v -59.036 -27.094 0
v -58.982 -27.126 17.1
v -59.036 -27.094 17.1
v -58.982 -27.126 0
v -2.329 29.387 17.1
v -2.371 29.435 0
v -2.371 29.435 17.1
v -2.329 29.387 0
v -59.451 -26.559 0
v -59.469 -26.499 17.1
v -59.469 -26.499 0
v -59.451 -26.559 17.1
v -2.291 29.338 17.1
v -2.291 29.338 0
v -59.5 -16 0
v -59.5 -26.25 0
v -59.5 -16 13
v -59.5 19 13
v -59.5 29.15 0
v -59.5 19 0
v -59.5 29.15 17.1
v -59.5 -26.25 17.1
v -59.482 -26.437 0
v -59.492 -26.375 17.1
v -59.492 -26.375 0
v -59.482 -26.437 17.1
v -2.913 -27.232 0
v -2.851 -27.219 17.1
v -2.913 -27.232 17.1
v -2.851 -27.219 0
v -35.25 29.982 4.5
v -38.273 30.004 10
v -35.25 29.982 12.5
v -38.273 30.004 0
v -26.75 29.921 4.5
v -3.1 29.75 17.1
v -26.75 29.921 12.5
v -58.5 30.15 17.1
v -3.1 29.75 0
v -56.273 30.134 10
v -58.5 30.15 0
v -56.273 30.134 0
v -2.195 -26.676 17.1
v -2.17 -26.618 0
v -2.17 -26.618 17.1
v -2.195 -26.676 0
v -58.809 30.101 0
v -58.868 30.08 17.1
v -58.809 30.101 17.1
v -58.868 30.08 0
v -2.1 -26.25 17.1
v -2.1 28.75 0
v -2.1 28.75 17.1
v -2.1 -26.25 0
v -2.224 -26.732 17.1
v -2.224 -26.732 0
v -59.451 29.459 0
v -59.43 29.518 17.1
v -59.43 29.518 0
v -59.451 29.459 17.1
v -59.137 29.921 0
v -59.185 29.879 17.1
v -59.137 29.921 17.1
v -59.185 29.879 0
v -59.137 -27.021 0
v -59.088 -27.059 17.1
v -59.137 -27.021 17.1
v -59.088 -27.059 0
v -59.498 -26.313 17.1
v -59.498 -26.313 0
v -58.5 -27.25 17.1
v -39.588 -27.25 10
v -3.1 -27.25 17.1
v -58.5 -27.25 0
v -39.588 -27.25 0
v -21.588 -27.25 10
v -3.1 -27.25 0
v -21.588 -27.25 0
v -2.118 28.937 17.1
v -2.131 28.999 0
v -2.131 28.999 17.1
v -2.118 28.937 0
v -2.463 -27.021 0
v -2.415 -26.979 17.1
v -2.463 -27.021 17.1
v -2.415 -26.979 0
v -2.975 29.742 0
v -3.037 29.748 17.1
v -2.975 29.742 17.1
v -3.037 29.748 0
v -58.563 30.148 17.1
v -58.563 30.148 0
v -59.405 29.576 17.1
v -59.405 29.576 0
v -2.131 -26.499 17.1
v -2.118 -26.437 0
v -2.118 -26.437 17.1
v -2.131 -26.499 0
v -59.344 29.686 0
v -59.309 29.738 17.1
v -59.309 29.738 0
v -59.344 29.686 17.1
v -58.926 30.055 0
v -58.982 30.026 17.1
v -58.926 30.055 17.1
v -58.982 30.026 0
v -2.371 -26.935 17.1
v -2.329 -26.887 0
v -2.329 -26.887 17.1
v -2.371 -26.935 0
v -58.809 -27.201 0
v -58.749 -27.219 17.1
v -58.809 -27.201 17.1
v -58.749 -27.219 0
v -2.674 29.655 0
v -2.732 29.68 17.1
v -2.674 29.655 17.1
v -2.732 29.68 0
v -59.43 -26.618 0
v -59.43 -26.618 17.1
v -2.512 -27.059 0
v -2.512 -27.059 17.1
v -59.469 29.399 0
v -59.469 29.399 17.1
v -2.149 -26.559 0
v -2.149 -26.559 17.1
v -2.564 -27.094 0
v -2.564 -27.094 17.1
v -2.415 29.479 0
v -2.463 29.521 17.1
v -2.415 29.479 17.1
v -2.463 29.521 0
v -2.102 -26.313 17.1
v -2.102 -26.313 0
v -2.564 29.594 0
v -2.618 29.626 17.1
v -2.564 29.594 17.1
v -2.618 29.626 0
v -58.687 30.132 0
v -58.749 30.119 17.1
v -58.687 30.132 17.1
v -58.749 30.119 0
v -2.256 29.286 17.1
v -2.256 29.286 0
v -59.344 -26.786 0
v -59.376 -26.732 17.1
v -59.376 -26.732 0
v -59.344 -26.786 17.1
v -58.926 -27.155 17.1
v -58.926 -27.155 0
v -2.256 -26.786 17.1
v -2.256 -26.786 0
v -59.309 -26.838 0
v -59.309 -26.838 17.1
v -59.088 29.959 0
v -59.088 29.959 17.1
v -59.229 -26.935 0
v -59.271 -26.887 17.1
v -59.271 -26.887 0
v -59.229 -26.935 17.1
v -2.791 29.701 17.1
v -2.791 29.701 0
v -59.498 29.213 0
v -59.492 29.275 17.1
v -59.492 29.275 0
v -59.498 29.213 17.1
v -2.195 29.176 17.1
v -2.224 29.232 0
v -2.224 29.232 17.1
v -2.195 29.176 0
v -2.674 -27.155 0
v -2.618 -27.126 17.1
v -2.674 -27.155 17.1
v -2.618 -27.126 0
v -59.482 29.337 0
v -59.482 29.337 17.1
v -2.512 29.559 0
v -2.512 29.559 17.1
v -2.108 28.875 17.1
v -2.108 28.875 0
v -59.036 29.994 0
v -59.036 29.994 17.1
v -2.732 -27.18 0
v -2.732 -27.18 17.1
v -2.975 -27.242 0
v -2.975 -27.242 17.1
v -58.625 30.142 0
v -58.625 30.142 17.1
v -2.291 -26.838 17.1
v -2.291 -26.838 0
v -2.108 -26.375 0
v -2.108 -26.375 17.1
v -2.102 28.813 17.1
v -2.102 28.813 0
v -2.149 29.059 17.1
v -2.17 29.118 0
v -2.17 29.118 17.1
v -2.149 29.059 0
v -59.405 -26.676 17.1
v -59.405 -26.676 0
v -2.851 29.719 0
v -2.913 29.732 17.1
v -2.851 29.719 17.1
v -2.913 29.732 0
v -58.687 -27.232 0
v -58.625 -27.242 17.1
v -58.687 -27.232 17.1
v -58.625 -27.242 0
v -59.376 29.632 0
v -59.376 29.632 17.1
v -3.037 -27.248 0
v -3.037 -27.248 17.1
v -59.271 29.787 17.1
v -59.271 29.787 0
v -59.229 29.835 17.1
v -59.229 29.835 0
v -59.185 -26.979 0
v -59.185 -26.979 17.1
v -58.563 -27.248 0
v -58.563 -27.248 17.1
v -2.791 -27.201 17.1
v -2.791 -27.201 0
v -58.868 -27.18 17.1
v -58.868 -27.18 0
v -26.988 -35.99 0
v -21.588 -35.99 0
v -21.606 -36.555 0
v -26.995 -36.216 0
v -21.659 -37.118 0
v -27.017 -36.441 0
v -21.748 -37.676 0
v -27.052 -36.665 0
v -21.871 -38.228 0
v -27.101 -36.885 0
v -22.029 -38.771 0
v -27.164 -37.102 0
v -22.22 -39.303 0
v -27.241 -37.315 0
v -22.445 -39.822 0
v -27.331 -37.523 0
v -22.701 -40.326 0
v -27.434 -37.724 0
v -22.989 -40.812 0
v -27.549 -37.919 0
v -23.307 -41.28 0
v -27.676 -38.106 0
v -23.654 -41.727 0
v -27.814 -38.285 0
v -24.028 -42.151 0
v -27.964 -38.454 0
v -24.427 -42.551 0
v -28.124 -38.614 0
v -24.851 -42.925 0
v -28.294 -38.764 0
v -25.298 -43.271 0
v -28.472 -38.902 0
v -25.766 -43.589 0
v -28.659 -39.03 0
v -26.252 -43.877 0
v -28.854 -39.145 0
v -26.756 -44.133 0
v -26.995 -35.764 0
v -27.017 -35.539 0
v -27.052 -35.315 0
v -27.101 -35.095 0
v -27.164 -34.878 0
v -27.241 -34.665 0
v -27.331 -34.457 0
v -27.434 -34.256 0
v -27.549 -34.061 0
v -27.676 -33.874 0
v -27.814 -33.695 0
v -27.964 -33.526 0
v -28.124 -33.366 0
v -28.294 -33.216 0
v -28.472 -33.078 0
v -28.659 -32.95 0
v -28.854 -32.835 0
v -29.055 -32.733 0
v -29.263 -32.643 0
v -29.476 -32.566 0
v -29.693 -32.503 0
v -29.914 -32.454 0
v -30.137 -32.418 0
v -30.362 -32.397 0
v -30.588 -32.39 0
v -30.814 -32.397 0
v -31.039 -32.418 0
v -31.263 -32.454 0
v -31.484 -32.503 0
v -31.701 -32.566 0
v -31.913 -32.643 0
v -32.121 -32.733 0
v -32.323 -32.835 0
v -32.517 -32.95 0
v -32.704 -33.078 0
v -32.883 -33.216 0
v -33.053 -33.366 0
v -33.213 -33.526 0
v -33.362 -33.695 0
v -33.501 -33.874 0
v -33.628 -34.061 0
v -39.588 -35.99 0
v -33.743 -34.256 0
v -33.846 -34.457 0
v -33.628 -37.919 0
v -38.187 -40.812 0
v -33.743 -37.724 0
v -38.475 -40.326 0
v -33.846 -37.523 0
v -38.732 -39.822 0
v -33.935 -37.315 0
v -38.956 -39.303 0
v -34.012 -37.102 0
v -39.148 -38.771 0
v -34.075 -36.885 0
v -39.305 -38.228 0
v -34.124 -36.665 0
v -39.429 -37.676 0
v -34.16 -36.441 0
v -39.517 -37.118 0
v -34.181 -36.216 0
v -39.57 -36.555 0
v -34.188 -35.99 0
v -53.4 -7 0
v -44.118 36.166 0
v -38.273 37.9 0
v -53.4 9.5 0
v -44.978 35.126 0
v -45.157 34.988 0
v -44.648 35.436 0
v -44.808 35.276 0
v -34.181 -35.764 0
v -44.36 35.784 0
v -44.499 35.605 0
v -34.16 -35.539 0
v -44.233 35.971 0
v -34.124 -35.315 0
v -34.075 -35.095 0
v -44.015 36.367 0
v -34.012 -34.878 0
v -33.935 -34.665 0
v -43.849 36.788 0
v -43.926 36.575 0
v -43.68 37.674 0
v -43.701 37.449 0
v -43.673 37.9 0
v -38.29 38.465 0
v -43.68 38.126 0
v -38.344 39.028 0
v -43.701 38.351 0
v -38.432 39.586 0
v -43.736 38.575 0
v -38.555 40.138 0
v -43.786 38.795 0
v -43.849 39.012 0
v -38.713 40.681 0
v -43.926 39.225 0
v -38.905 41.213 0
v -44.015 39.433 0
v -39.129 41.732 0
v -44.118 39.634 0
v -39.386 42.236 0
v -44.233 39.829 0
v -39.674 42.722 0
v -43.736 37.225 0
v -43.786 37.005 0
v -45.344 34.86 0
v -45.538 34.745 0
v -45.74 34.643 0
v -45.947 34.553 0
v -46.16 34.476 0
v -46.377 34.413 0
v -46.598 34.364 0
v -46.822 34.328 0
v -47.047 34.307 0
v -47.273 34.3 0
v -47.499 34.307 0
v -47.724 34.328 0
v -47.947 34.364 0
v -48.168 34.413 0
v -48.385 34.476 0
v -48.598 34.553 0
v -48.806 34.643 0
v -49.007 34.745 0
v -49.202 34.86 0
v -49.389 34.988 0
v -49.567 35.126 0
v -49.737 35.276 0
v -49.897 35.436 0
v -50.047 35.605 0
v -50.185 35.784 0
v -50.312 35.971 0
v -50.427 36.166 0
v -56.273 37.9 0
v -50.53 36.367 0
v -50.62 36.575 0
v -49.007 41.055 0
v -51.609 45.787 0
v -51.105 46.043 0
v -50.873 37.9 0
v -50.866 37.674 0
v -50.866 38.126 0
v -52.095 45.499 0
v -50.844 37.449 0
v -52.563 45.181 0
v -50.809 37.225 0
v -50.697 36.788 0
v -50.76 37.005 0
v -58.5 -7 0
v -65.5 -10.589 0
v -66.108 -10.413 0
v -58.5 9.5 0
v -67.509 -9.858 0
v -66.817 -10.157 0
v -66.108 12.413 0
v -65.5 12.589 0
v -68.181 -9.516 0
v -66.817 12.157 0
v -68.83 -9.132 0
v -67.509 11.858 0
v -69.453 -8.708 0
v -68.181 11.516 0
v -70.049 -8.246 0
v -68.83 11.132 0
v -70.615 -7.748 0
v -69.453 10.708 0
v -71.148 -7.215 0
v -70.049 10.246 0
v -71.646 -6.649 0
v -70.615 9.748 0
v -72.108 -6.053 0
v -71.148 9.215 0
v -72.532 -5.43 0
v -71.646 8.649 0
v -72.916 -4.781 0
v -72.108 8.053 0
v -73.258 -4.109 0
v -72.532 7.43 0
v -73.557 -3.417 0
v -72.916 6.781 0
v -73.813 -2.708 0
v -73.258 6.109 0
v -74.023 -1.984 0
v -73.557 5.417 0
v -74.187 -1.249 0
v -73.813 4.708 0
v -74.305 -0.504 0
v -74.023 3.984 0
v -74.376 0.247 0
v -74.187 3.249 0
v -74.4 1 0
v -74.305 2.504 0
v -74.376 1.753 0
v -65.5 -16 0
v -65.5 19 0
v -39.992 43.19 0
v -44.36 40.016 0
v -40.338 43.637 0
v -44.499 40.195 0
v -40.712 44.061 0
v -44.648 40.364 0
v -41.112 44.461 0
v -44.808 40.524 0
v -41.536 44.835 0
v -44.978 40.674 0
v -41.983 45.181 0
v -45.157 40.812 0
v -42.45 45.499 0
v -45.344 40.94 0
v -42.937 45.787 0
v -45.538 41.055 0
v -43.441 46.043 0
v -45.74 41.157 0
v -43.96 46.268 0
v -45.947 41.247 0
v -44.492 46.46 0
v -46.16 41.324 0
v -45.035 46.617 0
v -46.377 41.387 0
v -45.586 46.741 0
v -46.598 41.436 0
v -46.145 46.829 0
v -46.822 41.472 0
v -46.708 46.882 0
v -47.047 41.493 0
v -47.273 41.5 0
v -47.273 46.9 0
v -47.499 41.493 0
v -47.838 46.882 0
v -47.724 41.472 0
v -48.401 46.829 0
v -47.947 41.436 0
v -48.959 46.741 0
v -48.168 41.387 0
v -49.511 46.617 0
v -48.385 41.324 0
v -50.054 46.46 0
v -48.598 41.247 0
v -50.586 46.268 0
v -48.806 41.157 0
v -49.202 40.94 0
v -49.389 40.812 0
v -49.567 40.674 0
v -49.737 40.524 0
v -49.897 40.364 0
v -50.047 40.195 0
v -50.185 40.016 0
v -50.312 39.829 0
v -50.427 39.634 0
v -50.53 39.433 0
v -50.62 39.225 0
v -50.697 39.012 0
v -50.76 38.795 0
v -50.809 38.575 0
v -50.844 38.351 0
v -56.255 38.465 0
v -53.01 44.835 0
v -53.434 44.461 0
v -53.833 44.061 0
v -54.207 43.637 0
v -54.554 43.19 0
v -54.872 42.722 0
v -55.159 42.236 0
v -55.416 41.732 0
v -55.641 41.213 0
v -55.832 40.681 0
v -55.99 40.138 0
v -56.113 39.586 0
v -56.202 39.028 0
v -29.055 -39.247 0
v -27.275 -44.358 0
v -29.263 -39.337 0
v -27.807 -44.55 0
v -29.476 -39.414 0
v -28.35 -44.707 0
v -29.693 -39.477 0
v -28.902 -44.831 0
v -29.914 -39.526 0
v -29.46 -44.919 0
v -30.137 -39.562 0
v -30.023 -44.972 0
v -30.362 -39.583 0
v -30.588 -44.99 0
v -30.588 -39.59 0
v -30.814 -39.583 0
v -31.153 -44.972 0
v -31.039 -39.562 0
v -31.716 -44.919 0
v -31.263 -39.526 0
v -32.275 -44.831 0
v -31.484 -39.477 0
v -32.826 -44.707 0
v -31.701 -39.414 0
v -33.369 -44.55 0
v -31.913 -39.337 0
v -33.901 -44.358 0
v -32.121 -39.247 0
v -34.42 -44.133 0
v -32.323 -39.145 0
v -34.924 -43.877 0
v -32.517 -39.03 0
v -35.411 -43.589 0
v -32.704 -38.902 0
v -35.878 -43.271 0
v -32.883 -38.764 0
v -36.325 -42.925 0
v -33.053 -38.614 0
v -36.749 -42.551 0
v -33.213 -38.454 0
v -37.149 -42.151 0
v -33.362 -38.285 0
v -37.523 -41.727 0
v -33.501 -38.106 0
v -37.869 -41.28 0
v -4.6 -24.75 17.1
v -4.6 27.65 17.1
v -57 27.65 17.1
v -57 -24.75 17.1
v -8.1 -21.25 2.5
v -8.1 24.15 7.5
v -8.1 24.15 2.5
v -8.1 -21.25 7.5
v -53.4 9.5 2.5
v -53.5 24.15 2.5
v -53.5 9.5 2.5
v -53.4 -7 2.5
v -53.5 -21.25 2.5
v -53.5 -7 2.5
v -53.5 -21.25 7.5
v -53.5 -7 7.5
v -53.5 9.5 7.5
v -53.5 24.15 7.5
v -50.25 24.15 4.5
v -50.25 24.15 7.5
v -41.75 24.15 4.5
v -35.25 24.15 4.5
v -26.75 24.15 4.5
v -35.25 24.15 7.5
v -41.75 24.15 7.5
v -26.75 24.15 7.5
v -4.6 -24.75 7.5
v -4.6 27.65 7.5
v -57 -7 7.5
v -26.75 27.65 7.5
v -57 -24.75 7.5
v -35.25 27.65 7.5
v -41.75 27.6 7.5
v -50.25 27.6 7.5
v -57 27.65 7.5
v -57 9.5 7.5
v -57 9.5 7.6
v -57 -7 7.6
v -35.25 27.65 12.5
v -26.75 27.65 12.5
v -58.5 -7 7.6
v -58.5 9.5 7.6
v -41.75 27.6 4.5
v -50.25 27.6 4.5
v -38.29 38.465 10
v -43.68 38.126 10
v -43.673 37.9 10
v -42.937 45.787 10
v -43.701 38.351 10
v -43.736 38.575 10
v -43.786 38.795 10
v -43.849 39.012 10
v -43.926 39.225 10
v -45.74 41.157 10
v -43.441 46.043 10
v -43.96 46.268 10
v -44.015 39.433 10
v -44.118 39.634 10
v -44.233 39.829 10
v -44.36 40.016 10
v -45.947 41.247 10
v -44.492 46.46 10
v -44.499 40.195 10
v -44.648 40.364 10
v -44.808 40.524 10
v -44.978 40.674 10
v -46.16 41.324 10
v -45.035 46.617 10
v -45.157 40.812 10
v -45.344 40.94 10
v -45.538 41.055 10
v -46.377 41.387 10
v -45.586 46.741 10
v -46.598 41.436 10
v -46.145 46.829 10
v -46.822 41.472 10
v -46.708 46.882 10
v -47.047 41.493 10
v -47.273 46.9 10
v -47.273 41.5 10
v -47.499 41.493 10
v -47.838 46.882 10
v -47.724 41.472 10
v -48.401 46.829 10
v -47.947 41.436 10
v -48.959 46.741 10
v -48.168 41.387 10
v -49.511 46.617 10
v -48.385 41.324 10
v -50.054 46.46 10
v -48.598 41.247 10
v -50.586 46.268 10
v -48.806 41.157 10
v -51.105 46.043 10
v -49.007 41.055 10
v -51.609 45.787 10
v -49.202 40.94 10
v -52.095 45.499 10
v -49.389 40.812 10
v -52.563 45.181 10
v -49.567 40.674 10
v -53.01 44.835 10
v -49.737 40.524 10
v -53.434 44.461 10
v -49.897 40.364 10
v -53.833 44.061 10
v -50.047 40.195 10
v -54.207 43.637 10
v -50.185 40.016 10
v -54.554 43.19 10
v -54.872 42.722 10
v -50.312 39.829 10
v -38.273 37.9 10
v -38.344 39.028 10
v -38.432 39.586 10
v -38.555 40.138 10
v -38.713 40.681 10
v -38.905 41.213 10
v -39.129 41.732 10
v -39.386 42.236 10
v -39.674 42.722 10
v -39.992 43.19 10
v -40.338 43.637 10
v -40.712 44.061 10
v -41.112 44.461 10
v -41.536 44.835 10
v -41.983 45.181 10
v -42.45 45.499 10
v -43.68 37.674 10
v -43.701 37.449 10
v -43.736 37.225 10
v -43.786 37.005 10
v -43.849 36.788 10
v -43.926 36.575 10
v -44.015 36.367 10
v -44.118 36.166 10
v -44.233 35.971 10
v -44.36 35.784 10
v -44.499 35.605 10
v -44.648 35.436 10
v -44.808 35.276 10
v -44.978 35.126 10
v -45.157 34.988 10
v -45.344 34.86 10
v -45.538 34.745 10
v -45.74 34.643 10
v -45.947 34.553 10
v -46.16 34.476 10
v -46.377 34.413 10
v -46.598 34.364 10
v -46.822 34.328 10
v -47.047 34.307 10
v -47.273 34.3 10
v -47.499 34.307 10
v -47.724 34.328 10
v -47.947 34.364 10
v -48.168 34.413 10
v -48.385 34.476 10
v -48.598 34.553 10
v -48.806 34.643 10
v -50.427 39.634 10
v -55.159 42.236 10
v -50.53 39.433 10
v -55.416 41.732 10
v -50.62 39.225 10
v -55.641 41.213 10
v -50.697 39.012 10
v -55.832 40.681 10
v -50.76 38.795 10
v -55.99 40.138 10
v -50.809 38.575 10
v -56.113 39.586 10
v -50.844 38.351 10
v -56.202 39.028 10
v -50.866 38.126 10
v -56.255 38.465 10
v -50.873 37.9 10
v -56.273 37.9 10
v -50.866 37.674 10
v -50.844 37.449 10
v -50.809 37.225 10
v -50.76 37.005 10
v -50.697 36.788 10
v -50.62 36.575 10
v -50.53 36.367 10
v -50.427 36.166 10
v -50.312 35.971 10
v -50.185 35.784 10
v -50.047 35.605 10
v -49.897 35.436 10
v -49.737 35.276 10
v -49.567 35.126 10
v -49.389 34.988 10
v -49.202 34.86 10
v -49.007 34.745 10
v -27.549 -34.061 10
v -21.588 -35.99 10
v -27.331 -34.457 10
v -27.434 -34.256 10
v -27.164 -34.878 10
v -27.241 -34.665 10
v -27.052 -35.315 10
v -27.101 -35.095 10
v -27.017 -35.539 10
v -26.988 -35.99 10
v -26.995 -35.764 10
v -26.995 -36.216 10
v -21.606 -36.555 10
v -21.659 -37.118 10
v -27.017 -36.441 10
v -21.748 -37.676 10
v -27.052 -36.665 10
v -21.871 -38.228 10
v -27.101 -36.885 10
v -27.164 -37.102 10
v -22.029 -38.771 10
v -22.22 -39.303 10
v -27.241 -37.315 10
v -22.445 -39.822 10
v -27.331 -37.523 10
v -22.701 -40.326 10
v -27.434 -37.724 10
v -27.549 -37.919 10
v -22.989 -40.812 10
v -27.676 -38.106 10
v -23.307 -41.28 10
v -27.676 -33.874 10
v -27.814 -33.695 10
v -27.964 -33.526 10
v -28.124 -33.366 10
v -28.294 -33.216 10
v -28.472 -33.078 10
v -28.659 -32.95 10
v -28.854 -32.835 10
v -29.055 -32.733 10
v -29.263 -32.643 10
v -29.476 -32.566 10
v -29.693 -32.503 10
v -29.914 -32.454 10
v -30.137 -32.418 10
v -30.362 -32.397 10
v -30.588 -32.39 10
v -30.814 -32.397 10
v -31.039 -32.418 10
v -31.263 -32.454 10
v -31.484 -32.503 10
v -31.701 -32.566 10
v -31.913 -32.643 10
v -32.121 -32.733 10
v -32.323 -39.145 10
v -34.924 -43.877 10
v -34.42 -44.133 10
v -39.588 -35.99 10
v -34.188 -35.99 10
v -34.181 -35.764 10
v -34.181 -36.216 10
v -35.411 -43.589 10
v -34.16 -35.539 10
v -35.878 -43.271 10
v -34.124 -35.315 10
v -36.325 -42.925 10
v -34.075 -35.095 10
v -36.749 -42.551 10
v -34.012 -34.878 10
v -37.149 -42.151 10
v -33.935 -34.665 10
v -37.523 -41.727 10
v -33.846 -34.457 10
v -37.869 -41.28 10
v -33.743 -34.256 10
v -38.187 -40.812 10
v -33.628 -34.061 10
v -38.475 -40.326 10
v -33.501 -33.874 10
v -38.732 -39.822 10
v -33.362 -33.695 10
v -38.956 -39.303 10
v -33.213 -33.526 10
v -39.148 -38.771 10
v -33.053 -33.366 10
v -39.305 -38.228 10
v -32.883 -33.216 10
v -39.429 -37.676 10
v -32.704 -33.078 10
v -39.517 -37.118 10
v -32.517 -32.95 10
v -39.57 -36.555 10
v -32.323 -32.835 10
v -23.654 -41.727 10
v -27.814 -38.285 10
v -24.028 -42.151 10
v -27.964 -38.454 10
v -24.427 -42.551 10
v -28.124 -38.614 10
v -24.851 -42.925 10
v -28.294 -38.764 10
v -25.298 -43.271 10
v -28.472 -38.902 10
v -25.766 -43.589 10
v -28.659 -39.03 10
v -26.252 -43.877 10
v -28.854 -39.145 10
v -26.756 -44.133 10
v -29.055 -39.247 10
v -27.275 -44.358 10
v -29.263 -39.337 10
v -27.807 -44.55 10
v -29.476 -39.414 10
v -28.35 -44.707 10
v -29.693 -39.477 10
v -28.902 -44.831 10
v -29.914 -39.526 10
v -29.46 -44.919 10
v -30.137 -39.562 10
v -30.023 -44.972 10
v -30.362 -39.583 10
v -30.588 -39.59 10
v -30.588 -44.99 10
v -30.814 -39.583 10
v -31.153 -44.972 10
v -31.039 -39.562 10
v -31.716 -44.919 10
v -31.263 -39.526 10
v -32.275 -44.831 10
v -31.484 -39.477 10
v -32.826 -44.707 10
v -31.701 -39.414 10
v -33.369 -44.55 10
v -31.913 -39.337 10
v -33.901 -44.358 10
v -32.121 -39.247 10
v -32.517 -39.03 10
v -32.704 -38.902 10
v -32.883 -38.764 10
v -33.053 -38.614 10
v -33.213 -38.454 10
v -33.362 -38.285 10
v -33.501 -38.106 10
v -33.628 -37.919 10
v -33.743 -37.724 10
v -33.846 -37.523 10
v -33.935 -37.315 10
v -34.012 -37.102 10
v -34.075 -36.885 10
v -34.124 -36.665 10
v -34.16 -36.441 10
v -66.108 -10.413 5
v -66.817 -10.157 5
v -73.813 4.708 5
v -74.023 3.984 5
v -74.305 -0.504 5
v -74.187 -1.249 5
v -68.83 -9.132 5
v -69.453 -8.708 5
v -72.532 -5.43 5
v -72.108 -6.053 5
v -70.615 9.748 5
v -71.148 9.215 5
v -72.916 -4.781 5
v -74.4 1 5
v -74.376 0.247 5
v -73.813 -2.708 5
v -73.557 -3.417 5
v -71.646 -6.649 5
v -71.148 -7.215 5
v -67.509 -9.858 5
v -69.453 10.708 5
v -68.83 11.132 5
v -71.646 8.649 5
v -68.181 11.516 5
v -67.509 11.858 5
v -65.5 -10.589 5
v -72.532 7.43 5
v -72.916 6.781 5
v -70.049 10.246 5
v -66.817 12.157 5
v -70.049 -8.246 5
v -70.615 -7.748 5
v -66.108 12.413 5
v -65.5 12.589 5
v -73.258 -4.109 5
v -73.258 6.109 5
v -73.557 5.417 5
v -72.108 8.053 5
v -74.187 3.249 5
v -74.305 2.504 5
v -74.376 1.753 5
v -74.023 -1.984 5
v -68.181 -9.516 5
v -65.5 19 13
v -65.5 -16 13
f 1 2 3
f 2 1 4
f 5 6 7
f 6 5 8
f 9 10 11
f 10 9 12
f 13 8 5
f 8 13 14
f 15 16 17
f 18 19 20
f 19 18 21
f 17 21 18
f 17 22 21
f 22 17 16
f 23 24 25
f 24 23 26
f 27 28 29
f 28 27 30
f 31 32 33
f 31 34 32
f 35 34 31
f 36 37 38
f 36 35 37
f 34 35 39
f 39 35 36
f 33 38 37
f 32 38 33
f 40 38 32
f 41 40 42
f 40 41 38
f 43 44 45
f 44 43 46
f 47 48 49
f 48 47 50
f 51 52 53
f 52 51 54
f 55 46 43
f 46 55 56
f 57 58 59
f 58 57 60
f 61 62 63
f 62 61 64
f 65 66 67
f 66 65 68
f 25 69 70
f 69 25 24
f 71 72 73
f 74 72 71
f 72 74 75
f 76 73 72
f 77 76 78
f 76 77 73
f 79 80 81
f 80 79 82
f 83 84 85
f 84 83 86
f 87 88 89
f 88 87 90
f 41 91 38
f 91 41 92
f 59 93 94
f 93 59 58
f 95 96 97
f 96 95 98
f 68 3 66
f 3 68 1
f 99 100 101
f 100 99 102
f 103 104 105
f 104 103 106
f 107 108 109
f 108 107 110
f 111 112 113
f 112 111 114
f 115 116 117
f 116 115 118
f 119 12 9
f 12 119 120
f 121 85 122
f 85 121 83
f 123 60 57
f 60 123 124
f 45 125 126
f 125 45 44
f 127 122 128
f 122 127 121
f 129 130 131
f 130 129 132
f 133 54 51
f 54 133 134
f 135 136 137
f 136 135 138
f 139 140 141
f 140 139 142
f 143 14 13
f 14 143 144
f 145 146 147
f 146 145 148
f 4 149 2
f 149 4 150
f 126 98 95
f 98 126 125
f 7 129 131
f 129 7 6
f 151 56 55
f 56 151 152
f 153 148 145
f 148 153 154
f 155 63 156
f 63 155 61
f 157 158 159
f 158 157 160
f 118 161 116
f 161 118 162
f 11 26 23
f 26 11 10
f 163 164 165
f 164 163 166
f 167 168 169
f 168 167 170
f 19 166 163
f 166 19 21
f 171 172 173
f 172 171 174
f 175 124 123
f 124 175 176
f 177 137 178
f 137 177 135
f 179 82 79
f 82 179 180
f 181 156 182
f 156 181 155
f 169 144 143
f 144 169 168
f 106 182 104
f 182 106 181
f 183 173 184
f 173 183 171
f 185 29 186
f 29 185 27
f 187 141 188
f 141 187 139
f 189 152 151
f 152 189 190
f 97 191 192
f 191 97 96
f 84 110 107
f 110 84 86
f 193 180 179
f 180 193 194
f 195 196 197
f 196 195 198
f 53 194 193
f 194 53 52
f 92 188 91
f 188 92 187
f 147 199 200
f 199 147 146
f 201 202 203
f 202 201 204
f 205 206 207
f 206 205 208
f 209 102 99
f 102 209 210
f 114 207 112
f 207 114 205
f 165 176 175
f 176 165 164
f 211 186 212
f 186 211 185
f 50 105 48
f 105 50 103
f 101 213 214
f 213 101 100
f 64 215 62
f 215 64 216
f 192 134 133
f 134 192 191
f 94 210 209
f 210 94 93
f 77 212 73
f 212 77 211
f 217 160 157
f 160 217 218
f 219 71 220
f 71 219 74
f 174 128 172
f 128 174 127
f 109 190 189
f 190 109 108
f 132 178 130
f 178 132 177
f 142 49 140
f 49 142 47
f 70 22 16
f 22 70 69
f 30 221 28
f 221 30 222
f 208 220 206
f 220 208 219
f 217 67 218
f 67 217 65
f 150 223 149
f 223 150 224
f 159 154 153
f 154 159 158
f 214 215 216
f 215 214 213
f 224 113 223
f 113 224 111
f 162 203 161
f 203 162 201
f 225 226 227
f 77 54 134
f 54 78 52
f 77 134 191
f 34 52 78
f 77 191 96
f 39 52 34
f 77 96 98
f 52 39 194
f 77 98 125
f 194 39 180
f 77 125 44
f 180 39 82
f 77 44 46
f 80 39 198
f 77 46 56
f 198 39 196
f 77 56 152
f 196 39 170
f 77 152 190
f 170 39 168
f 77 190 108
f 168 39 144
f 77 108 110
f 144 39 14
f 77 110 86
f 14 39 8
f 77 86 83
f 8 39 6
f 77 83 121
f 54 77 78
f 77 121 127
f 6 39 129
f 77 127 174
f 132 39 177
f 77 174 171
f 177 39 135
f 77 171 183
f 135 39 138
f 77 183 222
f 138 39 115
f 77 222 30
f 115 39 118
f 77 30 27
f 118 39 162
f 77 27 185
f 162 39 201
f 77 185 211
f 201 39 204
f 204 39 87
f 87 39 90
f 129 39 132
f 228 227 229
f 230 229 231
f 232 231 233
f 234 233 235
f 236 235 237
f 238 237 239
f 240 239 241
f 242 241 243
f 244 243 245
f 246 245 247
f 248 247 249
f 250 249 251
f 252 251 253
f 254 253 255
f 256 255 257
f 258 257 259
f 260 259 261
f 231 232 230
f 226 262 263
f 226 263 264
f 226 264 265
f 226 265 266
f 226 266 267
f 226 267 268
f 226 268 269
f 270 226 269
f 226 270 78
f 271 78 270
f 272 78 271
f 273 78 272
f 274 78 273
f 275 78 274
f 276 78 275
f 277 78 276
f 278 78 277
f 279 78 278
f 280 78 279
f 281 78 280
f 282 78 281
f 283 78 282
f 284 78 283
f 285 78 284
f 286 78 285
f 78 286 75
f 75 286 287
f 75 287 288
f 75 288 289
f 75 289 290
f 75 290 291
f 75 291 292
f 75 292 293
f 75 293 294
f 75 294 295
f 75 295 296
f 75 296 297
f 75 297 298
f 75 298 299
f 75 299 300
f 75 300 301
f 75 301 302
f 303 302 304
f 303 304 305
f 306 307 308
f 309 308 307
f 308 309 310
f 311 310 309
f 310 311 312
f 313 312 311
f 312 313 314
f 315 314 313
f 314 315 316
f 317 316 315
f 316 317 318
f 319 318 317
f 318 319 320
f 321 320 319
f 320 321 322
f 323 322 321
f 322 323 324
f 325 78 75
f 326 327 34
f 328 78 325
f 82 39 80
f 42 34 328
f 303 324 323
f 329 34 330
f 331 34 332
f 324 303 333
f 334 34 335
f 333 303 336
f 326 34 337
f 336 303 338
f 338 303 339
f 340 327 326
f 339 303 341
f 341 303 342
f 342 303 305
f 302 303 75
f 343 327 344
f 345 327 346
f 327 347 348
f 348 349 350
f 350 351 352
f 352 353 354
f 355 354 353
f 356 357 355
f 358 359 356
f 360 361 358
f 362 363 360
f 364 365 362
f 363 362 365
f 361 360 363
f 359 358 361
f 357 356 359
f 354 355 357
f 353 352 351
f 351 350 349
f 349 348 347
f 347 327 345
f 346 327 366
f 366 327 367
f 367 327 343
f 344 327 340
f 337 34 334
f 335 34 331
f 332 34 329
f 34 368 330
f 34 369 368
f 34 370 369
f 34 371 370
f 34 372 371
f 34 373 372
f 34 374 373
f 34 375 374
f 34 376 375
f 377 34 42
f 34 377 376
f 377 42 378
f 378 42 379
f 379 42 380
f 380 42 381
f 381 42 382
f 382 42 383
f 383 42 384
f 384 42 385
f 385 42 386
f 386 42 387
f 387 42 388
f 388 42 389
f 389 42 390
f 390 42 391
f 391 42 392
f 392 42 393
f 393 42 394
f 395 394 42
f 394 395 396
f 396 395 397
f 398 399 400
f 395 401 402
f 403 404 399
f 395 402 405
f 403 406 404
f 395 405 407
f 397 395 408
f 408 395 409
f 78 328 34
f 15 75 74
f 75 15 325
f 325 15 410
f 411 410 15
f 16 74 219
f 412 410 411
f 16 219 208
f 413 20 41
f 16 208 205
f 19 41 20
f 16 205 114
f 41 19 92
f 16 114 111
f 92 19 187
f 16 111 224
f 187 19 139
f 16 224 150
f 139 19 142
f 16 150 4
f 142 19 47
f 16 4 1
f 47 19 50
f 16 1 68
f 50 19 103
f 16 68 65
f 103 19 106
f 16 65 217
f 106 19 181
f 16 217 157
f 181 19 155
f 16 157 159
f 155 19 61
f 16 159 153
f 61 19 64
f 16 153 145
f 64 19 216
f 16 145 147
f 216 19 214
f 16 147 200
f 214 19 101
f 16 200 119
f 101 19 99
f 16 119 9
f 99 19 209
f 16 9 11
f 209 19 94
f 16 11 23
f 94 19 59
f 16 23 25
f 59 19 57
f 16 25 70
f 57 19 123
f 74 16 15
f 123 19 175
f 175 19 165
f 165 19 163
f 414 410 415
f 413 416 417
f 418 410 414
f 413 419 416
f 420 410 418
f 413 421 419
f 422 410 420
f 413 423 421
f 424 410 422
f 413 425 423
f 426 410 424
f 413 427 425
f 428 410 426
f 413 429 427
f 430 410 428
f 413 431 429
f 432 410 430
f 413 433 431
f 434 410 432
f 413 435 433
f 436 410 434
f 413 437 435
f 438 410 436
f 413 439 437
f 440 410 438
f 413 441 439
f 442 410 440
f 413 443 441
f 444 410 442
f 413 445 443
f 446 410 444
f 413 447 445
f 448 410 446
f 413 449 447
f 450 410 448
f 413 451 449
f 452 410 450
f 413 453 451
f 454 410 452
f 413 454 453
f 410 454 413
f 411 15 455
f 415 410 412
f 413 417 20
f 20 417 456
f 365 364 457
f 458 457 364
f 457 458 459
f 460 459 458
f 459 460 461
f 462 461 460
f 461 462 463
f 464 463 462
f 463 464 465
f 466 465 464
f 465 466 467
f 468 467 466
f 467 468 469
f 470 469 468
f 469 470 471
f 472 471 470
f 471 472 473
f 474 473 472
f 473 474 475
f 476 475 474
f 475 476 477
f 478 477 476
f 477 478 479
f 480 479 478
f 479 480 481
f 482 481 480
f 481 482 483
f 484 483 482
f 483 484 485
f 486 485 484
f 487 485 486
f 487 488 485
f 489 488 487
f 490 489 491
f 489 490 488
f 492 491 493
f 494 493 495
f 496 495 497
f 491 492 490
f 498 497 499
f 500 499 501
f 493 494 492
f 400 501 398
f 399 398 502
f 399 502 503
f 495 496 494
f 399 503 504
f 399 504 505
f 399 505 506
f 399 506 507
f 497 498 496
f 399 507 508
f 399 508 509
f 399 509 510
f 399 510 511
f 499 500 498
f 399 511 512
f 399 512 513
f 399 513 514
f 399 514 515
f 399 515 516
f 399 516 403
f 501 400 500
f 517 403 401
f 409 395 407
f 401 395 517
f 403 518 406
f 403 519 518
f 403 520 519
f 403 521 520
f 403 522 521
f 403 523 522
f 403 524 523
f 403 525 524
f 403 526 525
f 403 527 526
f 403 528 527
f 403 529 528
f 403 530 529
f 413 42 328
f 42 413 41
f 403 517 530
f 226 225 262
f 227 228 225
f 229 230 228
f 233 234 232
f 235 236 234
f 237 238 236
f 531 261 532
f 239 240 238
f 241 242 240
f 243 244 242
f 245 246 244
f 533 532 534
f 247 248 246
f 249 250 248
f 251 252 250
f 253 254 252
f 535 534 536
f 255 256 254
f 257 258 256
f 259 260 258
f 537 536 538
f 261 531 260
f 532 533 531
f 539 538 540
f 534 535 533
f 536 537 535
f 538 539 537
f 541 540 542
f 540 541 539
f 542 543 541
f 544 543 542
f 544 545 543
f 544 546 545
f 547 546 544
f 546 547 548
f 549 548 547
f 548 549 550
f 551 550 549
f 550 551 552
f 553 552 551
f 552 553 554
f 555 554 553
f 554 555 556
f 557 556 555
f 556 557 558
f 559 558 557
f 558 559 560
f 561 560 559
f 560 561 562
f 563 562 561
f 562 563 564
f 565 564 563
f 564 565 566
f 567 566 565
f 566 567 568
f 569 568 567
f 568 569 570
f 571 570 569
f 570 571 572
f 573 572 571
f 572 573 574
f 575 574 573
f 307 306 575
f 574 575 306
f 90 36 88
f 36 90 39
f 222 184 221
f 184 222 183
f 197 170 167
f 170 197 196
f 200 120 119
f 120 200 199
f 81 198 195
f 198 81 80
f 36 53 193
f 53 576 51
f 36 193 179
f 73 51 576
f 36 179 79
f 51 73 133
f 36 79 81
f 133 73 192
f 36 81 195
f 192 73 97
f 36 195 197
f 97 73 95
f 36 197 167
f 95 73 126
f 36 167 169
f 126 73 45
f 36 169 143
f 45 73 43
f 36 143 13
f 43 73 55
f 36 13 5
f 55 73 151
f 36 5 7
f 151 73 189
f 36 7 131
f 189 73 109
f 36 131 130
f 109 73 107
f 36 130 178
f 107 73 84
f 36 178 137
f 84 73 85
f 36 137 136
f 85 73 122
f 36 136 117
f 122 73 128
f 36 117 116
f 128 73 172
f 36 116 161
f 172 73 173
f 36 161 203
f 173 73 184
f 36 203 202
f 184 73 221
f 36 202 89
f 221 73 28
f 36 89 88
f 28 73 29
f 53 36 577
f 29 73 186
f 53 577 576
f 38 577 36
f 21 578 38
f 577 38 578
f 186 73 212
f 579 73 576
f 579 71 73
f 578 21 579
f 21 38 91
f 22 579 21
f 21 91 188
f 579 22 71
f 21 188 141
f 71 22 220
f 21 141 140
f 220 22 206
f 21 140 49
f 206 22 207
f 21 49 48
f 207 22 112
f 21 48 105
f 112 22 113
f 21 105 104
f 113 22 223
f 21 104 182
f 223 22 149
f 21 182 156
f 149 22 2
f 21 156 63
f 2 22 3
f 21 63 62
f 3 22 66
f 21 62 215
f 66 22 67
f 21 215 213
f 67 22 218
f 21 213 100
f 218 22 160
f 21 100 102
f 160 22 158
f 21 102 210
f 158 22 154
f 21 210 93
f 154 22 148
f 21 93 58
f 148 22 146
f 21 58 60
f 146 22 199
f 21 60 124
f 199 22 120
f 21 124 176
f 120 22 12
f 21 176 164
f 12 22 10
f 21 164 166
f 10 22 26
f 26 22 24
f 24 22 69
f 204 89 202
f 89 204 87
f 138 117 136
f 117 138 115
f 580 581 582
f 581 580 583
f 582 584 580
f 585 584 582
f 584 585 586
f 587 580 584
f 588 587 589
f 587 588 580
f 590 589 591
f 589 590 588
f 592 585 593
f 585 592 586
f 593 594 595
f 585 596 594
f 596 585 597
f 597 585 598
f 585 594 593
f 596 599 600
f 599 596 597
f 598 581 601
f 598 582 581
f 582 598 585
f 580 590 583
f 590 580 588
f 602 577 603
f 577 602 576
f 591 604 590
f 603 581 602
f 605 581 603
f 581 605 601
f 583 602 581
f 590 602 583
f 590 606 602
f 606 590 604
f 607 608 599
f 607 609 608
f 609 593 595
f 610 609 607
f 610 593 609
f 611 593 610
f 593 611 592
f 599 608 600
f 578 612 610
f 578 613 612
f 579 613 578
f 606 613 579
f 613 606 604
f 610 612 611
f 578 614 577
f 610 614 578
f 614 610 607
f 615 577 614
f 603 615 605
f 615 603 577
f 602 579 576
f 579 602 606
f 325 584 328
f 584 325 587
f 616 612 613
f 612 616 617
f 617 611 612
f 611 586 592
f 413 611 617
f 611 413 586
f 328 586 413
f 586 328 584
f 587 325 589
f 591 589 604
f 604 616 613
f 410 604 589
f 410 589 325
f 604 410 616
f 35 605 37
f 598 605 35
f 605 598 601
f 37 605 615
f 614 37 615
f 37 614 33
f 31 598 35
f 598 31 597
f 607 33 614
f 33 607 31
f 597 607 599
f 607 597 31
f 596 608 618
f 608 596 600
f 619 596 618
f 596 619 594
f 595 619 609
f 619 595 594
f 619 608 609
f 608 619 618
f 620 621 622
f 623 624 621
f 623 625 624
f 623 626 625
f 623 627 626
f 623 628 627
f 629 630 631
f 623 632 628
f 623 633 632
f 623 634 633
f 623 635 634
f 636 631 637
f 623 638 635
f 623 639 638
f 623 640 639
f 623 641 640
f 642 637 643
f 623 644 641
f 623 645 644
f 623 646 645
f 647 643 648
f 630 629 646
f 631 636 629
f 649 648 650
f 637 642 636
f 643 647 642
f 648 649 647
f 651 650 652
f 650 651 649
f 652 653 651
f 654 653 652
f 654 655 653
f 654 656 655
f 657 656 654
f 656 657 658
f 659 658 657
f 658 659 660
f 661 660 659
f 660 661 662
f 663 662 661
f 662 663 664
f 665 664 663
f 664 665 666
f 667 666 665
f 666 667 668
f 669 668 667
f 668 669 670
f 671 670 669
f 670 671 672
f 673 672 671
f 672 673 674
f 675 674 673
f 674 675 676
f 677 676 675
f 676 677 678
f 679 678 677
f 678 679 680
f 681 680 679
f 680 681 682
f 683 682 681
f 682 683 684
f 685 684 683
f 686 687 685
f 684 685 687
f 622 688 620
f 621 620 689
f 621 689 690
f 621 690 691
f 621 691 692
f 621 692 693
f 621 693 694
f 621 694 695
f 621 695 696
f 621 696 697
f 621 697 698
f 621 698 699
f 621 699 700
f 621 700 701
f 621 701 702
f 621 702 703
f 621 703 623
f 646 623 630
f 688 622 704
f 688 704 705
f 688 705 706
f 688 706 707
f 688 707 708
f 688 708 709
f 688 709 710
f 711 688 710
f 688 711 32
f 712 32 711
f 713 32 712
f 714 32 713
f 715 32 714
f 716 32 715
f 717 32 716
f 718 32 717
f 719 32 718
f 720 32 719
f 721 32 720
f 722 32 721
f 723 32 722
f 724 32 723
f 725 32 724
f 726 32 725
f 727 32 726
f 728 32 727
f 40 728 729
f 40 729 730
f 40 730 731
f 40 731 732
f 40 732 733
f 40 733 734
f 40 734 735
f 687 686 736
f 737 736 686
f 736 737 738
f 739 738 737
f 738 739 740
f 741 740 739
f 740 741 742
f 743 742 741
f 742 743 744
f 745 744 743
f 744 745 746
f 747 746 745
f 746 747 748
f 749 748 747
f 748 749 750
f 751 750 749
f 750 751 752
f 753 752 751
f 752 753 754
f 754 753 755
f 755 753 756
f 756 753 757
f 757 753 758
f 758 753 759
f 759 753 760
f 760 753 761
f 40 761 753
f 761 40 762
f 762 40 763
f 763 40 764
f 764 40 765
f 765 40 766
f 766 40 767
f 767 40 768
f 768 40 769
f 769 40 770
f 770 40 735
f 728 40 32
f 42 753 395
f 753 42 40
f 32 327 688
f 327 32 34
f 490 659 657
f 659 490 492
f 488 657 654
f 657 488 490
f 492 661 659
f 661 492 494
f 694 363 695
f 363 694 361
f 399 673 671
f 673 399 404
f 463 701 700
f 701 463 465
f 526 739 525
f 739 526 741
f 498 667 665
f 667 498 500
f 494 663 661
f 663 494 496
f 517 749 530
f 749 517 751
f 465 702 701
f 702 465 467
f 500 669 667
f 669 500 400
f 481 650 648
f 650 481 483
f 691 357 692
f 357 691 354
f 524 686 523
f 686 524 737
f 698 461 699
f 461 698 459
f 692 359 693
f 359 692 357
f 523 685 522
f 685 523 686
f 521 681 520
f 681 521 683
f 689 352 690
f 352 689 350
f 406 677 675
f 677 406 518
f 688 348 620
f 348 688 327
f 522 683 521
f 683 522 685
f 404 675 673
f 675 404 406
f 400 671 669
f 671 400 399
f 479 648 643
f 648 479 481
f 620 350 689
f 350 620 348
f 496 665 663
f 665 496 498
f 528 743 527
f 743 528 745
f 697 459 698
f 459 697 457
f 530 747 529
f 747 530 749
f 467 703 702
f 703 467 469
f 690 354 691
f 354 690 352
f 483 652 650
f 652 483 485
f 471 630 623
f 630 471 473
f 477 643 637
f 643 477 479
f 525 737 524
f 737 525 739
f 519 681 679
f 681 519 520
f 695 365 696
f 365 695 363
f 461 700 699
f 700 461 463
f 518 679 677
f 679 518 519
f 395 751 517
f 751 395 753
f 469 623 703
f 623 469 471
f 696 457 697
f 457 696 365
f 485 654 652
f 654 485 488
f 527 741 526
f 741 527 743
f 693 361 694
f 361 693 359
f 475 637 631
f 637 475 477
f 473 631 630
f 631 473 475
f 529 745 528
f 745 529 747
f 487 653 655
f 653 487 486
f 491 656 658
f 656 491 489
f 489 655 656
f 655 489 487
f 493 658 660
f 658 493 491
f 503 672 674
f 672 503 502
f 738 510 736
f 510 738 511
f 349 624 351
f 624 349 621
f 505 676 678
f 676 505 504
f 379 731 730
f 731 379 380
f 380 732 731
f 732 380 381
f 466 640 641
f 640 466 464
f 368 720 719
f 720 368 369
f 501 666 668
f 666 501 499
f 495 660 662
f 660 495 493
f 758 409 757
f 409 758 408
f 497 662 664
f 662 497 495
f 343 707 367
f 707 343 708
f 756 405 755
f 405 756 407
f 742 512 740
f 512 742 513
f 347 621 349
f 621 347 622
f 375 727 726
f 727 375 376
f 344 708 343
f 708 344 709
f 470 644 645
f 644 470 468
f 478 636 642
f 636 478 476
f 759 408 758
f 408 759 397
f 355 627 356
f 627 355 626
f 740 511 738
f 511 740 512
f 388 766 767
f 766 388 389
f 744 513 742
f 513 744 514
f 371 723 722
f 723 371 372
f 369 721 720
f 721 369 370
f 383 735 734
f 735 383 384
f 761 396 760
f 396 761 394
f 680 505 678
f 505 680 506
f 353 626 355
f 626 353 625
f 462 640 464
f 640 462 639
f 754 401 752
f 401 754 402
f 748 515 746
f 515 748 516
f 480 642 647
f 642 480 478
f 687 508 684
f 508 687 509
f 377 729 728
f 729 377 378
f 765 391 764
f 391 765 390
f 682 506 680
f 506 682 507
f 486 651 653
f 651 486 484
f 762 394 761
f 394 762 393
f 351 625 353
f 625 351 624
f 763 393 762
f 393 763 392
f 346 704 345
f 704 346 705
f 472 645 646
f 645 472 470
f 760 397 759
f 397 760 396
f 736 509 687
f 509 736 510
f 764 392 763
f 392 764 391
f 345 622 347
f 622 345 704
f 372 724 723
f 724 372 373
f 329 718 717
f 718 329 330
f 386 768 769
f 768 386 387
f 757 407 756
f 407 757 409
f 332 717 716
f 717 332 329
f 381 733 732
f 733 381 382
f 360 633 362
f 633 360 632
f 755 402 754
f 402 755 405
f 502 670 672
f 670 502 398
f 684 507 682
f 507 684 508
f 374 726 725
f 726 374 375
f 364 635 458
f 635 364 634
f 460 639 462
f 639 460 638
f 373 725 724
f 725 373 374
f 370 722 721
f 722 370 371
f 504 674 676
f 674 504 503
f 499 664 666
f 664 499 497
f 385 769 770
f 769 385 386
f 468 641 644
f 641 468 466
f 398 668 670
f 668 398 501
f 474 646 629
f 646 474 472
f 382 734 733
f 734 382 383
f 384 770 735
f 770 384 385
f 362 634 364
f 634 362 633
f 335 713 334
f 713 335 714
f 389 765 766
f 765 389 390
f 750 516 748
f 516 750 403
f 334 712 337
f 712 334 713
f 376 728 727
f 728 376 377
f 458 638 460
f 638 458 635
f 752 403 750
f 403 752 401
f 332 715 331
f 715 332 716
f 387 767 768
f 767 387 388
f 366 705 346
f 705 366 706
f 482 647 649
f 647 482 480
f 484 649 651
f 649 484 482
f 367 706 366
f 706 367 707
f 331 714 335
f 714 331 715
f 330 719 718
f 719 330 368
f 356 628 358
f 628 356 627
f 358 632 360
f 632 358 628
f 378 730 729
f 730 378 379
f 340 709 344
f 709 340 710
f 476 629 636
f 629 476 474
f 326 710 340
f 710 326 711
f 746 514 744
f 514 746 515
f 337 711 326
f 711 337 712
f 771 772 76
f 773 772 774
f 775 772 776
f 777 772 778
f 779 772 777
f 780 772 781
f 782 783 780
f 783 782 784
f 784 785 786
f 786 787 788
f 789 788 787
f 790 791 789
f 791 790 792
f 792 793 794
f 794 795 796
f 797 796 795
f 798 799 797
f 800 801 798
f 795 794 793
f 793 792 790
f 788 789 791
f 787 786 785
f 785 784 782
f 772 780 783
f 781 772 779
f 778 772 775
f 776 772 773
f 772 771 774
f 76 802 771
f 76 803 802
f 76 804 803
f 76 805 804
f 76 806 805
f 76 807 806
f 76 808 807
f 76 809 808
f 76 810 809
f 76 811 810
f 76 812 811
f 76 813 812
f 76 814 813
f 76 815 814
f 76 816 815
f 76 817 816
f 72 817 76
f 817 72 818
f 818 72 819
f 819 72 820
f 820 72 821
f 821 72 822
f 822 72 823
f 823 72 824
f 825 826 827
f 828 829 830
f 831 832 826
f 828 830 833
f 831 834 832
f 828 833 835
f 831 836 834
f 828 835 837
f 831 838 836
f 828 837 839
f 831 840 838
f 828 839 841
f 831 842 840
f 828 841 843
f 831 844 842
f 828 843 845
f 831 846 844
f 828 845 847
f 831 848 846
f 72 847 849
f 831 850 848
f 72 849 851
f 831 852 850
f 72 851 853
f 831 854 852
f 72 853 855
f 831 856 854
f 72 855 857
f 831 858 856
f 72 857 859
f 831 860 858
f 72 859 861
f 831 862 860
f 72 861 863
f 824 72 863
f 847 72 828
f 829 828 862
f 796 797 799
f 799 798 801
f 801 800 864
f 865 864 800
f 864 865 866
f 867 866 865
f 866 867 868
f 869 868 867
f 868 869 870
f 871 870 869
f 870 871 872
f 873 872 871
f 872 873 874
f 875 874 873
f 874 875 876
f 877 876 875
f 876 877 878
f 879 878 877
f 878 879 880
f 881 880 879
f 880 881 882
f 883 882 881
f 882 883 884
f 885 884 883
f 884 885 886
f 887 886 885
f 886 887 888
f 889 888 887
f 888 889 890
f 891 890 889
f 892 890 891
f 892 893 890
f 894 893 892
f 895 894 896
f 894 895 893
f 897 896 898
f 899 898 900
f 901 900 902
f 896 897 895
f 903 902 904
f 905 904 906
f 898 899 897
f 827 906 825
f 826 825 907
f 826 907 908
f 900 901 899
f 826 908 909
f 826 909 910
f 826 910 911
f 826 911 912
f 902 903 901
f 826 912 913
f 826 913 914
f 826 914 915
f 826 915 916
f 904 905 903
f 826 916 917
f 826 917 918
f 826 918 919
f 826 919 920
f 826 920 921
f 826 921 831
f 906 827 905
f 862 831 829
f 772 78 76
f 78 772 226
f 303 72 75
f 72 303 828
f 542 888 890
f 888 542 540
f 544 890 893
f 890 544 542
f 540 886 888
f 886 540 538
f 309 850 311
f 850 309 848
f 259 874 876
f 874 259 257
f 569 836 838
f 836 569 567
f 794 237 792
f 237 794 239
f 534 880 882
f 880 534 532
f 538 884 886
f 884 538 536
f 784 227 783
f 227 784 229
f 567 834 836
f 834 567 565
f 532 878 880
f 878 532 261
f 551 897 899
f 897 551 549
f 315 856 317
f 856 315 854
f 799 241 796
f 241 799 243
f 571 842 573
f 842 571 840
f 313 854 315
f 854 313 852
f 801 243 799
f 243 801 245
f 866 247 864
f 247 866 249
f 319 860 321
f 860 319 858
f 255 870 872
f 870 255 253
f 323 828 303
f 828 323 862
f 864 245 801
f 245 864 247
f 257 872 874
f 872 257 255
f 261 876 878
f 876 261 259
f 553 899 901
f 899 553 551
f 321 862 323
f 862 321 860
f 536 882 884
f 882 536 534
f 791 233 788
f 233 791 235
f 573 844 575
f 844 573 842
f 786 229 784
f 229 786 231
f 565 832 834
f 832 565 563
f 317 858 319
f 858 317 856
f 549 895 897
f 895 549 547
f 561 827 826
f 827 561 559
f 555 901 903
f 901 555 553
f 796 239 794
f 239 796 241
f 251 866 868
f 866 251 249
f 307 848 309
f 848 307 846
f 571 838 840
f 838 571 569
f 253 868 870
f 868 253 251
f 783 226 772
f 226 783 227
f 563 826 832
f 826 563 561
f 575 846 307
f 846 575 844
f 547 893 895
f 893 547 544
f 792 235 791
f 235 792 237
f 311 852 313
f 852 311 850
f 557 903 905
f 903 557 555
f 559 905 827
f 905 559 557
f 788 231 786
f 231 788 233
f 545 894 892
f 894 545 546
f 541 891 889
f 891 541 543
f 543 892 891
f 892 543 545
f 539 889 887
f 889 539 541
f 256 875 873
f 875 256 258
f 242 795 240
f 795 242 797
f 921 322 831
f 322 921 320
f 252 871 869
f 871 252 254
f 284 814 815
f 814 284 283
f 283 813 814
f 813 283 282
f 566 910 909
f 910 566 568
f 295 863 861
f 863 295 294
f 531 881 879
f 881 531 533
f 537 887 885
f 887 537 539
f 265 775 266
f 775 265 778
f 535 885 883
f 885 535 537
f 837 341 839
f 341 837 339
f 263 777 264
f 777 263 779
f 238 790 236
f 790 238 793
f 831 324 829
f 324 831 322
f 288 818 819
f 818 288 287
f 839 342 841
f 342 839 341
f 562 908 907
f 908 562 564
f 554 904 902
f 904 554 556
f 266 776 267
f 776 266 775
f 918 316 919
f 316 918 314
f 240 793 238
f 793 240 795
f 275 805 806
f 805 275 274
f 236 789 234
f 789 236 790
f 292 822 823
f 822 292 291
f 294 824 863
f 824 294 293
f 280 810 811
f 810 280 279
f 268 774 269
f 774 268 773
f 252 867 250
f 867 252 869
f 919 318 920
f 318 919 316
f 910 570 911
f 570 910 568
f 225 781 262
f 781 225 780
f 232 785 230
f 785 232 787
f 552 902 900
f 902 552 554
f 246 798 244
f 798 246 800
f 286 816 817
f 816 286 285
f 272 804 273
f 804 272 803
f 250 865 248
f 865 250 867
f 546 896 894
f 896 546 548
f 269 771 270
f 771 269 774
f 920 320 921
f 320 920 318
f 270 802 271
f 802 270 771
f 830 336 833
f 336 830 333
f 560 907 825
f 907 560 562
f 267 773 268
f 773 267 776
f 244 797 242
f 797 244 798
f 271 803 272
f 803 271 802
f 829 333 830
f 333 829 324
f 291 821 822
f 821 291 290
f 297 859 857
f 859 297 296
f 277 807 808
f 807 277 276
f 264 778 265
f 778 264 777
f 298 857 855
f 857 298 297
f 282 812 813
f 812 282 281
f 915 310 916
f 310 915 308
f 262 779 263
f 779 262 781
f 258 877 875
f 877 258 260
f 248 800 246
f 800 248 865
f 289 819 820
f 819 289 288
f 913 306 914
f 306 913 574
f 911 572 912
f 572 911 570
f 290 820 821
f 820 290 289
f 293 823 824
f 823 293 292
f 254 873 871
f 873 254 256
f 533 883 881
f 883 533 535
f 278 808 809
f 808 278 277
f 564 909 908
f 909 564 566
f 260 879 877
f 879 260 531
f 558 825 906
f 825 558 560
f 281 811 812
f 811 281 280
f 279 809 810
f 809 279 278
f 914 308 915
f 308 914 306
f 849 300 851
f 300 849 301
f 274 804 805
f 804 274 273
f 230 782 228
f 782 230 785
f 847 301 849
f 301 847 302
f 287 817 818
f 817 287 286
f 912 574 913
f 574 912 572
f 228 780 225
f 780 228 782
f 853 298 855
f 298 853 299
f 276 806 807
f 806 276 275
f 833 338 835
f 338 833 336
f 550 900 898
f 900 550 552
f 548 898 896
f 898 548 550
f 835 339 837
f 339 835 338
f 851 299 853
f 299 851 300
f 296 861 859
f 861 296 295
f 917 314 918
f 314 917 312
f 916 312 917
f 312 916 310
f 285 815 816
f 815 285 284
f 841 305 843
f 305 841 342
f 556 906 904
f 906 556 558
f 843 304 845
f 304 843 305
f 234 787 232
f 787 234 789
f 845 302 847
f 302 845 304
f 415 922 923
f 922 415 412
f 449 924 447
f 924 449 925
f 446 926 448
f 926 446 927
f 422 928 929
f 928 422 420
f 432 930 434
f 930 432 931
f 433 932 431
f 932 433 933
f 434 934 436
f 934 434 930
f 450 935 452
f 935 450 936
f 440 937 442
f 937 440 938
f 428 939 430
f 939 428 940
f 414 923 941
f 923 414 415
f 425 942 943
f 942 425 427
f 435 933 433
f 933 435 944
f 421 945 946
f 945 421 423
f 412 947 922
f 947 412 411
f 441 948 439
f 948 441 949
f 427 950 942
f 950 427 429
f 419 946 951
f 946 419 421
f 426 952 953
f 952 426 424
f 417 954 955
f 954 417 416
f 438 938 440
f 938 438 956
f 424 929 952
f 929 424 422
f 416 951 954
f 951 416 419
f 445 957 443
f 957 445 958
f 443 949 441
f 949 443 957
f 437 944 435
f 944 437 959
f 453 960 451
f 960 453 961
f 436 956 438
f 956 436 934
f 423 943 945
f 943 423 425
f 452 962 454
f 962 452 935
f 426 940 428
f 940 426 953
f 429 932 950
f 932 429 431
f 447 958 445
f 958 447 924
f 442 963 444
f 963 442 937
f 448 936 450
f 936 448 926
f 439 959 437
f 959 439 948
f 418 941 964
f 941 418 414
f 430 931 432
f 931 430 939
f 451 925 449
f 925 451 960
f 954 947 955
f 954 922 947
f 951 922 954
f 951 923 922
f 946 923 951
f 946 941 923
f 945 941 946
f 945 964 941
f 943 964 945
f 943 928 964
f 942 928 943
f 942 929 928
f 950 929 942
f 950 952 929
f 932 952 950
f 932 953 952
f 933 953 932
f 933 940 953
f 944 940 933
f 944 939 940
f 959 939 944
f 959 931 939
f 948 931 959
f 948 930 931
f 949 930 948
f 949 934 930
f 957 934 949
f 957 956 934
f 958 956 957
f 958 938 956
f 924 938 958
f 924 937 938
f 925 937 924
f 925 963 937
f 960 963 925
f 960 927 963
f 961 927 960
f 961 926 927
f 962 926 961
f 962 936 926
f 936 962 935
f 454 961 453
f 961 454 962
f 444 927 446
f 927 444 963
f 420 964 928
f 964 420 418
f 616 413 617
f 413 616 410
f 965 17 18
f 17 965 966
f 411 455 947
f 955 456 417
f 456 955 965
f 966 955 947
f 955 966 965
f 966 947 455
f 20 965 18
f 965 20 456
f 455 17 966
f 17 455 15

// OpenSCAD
/* [Global] */

// Which part would you like to see?
part = "both"; // [both:Lid and base,base:Base only,lid:Lid only]

/* [GPS Box] */

// Size of the GPS board
GpsBase = 52;

// Clearance required below the PCB
UnderDepth = 5;

// Clearance required above the PCB
OverDepth = 8;

// Width of the connection plug
CableHoleH = 13;

// Height of the connection plug
CableHoleW = 16.5;

// Distance of the connection from the edge of the board
CableHolePos = GpsBase/2 - CableHoleW/2 ; //16

// Mounting holes for the base? (Zero=no holes)
MountingCentres = 0;

// Diameter of the mounting holes?
MountingBoltSize = 3;

/* [Advanced Settings] */
// Thickness of the walls, lid and bottom
Thickness = 2.5;

// Width of the shelf that supports the PCB
Shelf = 3.5;

// Roundness of the corners
CornerRadius = 1;

// Thickness of the PCB
PCB = 1.6;

// Diameter of the hole in the lid
Window = 0;

// Extra tolerance for the lid/base fitting
Tolerance = 0.2;

/* [Hidden] */
j = 0.1;
$fn=100;
InnerHeight = UnderDepth + PCB + OverDepth;

BaseInnerLarge = GpsBase + (Tolerance * 2);
BaseInnerSmall = BaseInnerLarge - (Shelf * 2);
BaseOuter = BaseInnerLarge + (Thickness * 2);

LidOuterLip = BaseOuter;
LidOuter = BaseInnerLarge - (Tolerance * 2);
LidInner = LidOuter - (Thickness * 2);

SemiLidOuterLip = LidOuterLip / 2;
SemiLidOuter = LidOuter / 2;
SemiLidInner = LidInner / 2;

module Base()
{
	translate([0, 0, Thickness])
	difference()
	{
		// Walls & floor
		translate([0, 0, -Thickness])
		hull()
		{
			translate([BaseOuter-CornerRadius, GpsBase+Thickness*2-CornerRadius, 0]) cylinder(r = CornerRadius, h = InnerHeight+Thickness);
			translate([CornerRadius, BaseOuter-CornerRadius, 0]) cylinder(r = CornerRadius, h = InnerHeight+Thickness);
			translate([BaseOuter-CornerRadius, CornerRadius, 0]) cylinder(r = CornerRadius, h = InnerHeight+Thickness);
			translate([CornerRadius, CornerRadius, 0]) cylinder(r = CornerRadius, h = InnerHeight+Thickness);
		}
		
		// Deepest cut
		translate([Thickness+Shelf, Thickness+Shelf, 0]) cube([BaseInnerSmall, BaseInnerSmall, InnerHeight]);

		// Shelf
		translate([Thickness, Thickness, UnderDepth]) cube([BaseInnerLarge, BaseInnerLarge, InnerHeight]);
		
		// Hole for wire
		translate([-j, Thickness+CableHolePos, UnderDepth-CableHoleH]) cube([Thickness+Shelf+j*2, CableHoleW, CableHoleH+j]);
		
		// Mounting Holes
		if(MountingCentres > 0)
		{
			translate([-MountingCentres/2, -MountingCentres/2, 0]) translate([BaseOuter * 0.5, BaseOuter * 0.5, -Thickness-j]) cylinder(r = MountingBoltSize/2, h = Thickness+j*2);
			translate([-MountingCentres/2, MountingCentres/2, 0]) translate([BaseOuter * 0.5, BaseOuter * 0.5, -Thickness-j]) cylinder(r = MountingBoltSize/2, h = Thickness+j*2);
			translate([MountingCentres/2, -MountingCentres/2, 0]) translate([BaseOuter * 0.5, BaseOuter * 0.5, -Thickness-j]) cylinder(r = MountingBoltSize/2, h = Thickness+j*2);
			translate([MountingCentres/2, MountingCentres/2, 0]) translate([BaseOuter * 0.5, BaseOuter * 0.5, -Thickness-j]) cylinder(r = MountingBoltSize/2, h = Thickness+j*2);
		}
	}
    
}

module Lid()
{
	translate([SemiLidOuterLip, SemiLidOuterLip, 0])
	union()
	{
		difference()
		{
			// Lid lip
			hull()
			{
				translate([SemiLidOuterLip-CornerRadius,    SemiLidOuterLip-CornerRadius, 0]) cylinder(r = CornerRadius, h = Thickness);
				translate([-SemiLidOuterLip+CornerRadius,  SemiLidOuterLip-CornerRadius, 0]) cylinder(r = CornerRadius, h = Thickness);
				translate([SemiLidOuterLip-CornerRadius,   -SemiLidOuterLip+CornerRadius, 0]) cylinder(r = CornerRadius, h = Thickness);
				translate([-SemiLidOuterLip+CornerRadius, -SemiLidOuterLip+CornerRadius, 0]) cylinder(r = CornerRadius, h = Thickness);
			}
			
			if(Window > 0)
			{
				// GPS Window
				translate([0, 0, -j]) cylinder(r = Window/2, h = Thickness+j*2);
			}
		}

		difference()
		{
			// Outer dimension
			hull()
			{
				translate([SemiLidOuter-CornerRadius,   SemiLidOuter-CornerRadius, j*2]) cylinder(r = CornerRadius, h = OverDepth);
				translate([-SemiLidOuter+CornerRadius, SemiLidOuter-CornerRadius, j*2]) cylinder(r = CornerRadius, h = OverDepth);
				translate([-SemiLidOuter+CornerRadius, -SemiLidOuter+CornerRadius, j*2]) cylinder(r = CornerRadius, h = OverDepth);
				translate([SemiLidOuter-CornerRadius, -SemiLidOuter+CornerRadius, j*2]) cylinder(r = CornerRadius, h = OverDepth);
			}
			
			// Inner dimension
			hull()
			{			
				translate([SemiLidInner-CornerRadius,   SemiLidInner-CornerRadius, j]) cylinder(r = CornerRadius, h = OverDepth+j*2);
				translate([-SemiLidInner+CornerRadius, SemiLidInner-CornerRadius, j]) cylinder(r = CornerRadius, h = OverDepth+j*2);
				translate([-SemiLidInner+CornerRadius, -SemiLidInner+CornerRadius, j]) cylinder(r = CornerRadius, h = OverDepth+j*2);
				translate([SemiLidInner-CornerRadius, -SemiLidInner+CornerRadius, j]) cylinder(r = CornerRadius, h = OverDepth+j*2);
			}
		}
		
	}
}

module print_part()
{
	if (part == "lid")
	{
		translate([GpsBase+Thickness, GpsBase+Thickness, 0]*-0.5)
		Lid();
	} else if (part == "base")
	{
		translate([GpsBase+Thickness, GpsBase+Thickness, 0]*-0.5)
		Base();
		
	} else if (part == "both")
	{
		translate([-(GpsBase+Thickness*3), -(GpsBase+Thickness)*0.5, 0])
		Base();

		//translate([Thickness, -(GpsBase+Thickness)*0.5, 0]) 
		//Lid();
	}
}

difference(){
	print_part();
	translate([-35.25,21,4.5])cube([8.5,12,8]);//usb
	translate([-50.25,21,4.5])cube([8.5,6.6,8]);//usb

}

translate([-GpsBase-Thickness-11,-16,0])cube([7,35,13]); //cover

translate([-GpsBase/1.1,GpsBase/2+11.9,0])rotate([0,0,90])foot();
translate([-GpsBase/1.7,-GpsBase/2-(9.99),0])rotate([0,0,-90])foot();

module block(){
    h1 = 10;
    sc = 12;
    
    difference(){
        cylinder(h = h1/2, r=sc);
        translate([0,-sc,-2])cube([sc,sc*2,h1+15]);
    }
}
translate([-GpsBase*1.2,1,0])block(); //hole block

module foot() {
    h = 20;
    h1 = h/2;
    //Screw radius
    sc = 7.2/2; // 0.25"
    module f(){ //boxy inner edge
        translate([-sc*2.5,-sc*2.5,0])cube([sc*2.5,sc*5,h1]);
        cylinder(h = h1, r=sc*2.5);
    }
	difference(){ //actual hole
		f();
		translate([0,0,-0.1])cylinder(h = h1+1, r=sc);
	}

}
